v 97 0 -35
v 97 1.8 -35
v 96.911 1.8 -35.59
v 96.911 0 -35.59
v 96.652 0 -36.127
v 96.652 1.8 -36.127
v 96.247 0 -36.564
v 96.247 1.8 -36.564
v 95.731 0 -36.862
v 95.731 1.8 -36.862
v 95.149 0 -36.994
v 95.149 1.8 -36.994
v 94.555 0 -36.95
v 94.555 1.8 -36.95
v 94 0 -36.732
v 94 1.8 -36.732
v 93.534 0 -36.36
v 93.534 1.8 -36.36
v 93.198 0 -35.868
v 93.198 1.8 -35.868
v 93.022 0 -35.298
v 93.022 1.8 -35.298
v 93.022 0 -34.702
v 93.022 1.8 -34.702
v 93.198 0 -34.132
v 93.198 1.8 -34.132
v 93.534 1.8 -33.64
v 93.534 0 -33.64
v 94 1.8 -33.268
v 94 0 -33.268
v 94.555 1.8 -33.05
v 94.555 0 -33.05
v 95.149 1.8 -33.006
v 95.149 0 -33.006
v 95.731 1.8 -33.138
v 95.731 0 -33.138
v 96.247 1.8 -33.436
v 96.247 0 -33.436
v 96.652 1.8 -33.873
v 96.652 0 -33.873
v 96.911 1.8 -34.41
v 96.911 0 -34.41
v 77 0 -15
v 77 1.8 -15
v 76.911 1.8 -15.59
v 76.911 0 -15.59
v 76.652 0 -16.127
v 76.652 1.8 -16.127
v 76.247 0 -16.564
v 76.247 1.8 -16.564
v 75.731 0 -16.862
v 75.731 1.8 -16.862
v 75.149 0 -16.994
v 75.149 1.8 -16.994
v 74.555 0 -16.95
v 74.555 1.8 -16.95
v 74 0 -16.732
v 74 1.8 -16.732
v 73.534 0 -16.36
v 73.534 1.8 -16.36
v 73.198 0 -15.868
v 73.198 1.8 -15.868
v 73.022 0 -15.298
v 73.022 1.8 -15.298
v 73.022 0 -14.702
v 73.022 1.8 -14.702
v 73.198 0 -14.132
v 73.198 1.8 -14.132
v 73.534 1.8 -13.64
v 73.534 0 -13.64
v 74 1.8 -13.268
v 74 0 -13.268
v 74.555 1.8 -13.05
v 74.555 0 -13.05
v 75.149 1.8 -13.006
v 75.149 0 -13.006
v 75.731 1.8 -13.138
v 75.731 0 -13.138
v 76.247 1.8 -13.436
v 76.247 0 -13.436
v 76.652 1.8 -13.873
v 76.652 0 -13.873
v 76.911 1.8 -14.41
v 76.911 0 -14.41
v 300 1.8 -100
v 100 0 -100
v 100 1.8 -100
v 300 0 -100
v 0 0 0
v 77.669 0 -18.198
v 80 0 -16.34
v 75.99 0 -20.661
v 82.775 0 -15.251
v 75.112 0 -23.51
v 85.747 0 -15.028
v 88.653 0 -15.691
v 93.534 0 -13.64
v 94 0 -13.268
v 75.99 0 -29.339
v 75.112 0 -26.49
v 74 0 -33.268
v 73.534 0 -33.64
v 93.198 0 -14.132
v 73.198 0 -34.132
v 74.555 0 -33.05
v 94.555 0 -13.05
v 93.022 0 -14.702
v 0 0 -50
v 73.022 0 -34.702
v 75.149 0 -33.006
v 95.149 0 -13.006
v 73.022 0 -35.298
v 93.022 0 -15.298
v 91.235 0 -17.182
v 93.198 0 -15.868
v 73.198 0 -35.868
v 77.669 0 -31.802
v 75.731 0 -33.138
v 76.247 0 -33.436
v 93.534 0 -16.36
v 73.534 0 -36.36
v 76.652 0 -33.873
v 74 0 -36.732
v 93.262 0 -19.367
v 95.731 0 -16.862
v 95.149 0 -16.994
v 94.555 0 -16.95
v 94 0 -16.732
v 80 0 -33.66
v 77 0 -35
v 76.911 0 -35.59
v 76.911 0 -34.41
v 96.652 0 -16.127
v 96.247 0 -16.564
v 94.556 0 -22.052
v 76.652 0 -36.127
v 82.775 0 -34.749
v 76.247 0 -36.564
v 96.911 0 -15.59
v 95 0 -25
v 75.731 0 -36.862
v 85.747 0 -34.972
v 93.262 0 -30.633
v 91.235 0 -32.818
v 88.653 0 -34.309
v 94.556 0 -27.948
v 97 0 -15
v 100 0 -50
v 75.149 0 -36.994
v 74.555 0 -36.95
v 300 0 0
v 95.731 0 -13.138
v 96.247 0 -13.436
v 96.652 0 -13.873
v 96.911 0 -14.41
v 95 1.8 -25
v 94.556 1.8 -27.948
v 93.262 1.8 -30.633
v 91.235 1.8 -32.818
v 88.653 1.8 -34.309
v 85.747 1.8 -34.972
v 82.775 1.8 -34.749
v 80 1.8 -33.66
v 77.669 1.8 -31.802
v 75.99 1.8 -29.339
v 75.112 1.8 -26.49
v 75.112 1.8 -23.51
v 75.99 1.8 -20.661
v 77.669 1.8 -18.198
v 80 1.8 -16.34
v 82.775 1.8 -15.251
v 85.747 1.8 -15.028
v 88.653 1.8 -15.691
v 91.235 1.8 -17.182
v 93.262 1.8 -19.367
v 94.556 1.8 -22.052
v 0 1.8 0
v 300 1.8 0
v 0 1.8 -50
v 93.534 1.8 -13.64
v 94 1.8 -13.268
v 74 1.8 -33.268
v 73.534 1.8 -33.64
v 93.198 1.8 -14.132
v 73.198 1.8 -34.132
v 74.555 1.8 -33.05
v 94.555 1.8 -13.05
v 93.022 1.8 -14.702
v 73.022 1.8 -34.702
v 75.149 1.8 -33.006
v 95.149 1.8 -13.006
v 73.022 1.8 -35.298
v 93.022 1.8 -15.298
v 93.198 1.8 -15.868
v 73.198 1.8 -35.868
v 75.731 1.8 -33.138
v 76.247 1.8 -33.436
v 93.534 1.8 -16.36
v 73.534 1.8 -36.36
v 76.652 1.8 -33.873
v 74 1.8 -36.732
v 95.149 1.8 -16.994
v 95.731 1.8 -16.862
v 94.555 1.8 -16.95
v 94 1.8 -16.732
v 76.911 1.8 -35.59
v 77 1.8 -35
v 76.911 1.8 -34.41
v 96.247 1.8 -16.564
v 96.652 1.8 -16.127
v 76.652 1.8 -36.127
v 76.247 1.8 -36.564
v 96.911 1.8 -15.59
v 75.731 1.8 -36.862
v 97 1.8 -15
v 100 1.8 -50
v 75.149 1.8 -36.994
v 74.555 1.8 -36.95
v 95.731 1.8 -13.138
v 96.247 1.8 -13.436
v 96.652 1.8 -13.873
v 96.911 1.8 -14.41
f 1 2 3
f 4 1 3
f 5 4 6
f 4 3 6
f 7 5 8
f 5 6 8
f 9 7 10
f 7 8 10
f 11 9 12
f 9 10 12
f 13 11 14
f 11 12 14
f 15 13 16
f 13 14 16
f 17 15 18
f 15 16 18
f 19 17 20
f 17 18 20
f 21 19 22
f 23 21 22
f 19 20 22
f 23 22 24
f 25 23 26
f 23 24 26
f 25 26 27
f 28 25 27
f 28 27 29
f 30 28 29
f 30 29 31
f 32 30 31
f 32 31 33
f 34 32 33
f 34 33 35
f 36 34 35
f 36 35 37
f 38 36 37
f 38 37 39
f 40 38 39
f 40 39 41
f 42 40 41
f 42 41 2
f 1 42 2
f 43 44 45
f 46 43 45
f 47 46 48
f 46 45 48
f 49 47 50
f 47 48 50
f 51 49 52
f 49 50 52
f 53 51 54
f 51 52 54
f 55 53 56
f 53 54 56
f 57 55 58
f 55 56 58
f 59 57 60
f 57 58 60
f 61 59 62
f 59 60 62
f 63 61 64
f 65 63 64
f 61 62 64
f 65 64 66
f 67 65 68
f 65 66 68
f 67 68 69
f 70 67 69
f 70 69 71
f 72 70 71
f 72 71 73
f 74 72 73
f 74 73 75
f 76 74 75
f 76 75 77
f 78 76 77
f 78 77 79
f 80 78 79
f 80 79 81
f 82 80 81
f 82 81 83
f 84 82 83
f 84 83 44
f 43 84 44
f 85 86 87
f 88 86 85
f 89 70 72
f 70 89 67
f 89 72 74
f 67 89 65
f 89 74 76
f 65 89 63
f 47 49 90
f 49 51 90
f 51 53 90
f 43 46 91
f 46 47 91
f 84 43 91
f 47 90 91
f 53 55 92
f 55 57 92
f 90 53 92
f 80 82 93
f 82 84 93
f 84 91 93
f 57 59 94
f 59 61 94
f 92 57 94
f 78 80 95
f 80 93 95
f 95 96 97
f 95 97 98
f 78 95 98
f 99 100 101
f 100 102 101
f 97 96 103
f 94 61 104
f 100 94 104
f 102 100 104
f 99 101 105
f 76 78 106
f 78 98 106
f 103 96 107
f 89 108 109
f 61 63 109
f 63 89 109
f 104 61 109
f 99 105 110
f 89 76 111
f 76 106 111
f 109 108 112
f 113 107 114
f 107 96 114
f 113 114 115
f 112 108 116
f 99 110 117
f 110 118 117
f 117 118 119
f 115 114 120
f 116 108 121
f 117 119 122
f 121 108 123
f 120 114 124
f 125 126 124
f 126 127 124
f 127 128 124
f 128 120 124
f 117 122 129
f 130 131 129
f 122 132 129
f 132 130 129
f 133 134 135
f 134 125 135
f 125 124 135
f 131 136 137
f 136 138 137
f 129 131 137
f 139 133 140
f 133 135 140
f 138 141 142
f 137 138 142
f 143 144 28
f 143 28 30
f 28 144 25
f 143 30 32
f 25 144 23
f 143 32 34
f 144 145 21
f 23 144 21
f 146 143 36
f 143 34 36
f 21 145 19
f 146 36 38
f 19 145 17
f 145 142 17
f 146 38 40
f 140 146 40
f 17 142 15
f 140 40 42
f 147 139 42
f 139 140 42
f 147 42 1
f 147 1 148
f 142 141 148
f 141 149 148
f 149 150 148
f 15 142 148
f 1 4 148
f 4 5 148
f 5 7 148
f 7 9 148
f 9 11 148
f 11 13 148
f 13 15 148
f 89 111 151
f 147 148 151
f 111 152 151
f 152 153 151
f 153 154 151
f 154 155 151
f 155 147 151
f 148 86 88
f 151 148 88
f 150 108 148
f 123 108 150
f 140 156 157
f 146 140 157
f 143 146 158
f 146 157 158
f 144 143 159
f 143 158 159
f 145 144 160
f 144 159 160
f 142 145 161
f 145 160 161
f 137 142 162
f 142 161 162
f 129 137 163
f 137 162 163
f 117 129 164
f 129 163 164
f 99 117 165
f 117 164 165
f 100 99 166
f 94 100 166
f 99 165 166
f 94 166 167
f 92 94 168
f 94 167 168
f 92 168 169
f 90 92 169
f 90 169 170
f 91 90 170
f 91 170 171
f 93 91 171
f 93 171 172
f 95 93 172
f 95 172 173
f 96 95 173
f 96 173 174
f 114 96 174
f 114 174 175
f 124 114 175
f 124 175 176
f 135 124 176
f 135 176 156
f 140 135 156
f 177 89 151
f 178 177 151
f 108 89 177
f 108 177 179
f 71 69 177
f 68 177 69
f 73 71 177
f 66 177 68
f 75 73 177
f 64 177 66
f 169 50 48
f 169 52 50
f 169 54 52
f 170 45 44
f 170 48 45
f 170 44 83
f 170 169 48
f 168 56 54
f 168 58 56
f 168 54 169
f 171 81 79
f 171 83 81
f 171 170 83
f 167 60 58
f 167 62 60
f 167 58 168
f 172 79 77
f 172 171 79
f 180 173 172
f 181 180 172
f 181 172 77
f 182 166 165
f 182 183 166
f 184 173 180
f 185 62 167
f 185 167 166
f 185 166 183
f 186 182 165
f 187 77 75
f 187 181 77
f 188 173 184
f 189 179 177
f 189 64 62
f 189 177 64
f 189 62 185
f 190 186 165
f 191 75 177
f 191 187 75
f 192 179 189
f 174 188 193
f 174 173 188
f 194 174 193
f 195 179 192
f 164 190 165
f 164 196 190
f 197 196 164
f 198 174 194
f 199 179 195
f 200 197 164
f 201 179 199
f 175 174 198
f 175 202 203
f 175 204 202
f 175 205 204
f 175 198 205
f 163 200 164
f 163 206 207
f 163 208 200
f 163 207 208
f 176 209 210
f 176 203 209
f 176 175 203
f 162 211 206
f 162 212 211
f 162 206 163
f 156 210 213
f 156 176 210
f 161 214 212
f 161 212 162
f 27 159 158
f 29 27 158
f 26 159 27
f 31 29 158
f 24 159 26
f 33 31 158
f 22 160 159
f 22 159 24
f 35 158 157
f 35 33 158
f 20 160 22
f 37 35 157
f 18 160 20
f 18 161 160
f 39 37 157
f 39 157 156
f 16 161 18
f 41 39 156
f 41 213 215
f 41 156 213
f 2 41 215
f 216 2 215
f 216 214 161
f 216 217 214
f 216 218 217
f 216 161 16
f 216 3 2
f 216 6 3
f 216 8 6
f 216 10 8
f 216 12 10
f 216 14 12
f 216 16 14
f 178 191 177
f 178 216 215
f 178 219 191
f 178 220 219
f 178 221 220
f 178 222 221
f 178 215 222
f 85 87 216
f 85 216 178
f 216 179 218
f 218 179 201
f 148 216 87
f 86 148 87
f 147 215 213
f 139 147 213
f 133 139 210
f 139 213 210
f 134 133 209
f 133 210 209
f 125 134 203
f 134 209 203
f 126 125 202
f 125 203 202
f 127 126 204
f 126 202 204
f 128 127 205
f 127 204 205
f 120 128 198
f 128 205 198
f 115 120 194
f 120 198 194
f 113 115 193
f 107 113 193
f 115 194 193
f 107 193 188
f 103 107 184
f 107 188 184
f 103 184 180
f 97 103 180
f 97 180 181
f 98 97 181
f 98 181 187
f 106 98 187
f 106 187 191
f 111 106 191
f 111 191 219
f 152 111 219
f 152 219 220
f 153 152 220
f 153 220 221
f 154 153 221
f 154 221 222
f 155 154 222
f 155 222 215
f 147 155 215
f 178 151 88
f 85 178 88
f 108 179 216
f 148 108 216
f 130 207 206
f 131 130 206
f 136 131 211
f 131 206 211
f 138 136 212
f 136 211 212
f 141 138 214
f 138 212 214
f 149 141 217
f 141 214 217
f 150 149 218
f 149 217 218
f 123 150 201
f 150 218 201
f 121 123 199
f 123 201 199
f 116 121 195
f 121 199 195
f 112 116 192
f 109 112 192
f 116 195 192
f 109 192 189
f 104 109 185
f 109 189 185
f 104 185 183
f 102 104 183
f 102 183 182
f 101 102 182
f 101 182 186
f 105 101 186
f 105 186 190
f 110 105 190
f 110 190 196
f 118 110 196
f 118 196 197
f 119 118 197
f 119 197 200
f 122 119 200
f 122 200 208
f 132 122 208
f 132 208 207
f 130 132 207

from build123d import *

# Parameters (mm, degrees)
SKETCH_1_W          = 300
SKETCH_1_H          = 100
EXTRUDE_1_DEPTH     = 1.8
SKETCH_2_W          = 100
SKETCH_2_H          = 50
CUT_EXTRUDE_1_DEPTH = 2.8
SKETCH_3_R          = 2
SKETCH_3_R_2        = 10
CUT_EXTRUDE_2_DEPTH = 2.8


with BuildPart() as part:
    # 草图1 → 凸台-拉伸1 (new body)
    with BuildSketch(Plane(origin=(0, 0, 0), x_dir=(1, 0, 0), z_dir=(0, 1, 0))):
        with Locations((150, 50)):
            Rectangle(SKETCH_1_W, SKETCH_1_H)
    extrude(amount=EXTRUDE_1_DEPTH)

    # 草图2 → 切除-拉伸1 (cut, through all)
    with BuildSketch(Plane(origin=(0, 1.8, 0), x_dir=(1, 0, 0), z_dir=(0, 1, 0))):
        with Locations((50, 75)):
            Rectangle(SKETCH_2_W, SKETCH_2_H)
    extrude(amount=-CUT_EXTRUDE_1_DEPTH, mode=Mode.SUBTRACT)

    # 草图3 → 切除-拉伸2 (cut, through all)
    with BuildSketch(Plane(origin=(0, 1.8, 0), x_dir=(1, 0, 0), z_dir=(0, 1, 0))):
        with Locations((95, 35)):
            Circle(SKETCH_3_R)
        with Locations((75, 35)):
            Circle(SKETCH_3_R)
        with Locations((75, 15)):
            Circle(SKETCH_3_R)
        with Locations((95, 15)):
            Circle(SKETCH_3_R)
        with Locations((85, 25)):
            Circle(SKETCH_3_R_2)
    extrude(amount=-CUT_EXTRUDE_2_DEPTH, mode=Mode.SUBTRACT)


solid = part.part
